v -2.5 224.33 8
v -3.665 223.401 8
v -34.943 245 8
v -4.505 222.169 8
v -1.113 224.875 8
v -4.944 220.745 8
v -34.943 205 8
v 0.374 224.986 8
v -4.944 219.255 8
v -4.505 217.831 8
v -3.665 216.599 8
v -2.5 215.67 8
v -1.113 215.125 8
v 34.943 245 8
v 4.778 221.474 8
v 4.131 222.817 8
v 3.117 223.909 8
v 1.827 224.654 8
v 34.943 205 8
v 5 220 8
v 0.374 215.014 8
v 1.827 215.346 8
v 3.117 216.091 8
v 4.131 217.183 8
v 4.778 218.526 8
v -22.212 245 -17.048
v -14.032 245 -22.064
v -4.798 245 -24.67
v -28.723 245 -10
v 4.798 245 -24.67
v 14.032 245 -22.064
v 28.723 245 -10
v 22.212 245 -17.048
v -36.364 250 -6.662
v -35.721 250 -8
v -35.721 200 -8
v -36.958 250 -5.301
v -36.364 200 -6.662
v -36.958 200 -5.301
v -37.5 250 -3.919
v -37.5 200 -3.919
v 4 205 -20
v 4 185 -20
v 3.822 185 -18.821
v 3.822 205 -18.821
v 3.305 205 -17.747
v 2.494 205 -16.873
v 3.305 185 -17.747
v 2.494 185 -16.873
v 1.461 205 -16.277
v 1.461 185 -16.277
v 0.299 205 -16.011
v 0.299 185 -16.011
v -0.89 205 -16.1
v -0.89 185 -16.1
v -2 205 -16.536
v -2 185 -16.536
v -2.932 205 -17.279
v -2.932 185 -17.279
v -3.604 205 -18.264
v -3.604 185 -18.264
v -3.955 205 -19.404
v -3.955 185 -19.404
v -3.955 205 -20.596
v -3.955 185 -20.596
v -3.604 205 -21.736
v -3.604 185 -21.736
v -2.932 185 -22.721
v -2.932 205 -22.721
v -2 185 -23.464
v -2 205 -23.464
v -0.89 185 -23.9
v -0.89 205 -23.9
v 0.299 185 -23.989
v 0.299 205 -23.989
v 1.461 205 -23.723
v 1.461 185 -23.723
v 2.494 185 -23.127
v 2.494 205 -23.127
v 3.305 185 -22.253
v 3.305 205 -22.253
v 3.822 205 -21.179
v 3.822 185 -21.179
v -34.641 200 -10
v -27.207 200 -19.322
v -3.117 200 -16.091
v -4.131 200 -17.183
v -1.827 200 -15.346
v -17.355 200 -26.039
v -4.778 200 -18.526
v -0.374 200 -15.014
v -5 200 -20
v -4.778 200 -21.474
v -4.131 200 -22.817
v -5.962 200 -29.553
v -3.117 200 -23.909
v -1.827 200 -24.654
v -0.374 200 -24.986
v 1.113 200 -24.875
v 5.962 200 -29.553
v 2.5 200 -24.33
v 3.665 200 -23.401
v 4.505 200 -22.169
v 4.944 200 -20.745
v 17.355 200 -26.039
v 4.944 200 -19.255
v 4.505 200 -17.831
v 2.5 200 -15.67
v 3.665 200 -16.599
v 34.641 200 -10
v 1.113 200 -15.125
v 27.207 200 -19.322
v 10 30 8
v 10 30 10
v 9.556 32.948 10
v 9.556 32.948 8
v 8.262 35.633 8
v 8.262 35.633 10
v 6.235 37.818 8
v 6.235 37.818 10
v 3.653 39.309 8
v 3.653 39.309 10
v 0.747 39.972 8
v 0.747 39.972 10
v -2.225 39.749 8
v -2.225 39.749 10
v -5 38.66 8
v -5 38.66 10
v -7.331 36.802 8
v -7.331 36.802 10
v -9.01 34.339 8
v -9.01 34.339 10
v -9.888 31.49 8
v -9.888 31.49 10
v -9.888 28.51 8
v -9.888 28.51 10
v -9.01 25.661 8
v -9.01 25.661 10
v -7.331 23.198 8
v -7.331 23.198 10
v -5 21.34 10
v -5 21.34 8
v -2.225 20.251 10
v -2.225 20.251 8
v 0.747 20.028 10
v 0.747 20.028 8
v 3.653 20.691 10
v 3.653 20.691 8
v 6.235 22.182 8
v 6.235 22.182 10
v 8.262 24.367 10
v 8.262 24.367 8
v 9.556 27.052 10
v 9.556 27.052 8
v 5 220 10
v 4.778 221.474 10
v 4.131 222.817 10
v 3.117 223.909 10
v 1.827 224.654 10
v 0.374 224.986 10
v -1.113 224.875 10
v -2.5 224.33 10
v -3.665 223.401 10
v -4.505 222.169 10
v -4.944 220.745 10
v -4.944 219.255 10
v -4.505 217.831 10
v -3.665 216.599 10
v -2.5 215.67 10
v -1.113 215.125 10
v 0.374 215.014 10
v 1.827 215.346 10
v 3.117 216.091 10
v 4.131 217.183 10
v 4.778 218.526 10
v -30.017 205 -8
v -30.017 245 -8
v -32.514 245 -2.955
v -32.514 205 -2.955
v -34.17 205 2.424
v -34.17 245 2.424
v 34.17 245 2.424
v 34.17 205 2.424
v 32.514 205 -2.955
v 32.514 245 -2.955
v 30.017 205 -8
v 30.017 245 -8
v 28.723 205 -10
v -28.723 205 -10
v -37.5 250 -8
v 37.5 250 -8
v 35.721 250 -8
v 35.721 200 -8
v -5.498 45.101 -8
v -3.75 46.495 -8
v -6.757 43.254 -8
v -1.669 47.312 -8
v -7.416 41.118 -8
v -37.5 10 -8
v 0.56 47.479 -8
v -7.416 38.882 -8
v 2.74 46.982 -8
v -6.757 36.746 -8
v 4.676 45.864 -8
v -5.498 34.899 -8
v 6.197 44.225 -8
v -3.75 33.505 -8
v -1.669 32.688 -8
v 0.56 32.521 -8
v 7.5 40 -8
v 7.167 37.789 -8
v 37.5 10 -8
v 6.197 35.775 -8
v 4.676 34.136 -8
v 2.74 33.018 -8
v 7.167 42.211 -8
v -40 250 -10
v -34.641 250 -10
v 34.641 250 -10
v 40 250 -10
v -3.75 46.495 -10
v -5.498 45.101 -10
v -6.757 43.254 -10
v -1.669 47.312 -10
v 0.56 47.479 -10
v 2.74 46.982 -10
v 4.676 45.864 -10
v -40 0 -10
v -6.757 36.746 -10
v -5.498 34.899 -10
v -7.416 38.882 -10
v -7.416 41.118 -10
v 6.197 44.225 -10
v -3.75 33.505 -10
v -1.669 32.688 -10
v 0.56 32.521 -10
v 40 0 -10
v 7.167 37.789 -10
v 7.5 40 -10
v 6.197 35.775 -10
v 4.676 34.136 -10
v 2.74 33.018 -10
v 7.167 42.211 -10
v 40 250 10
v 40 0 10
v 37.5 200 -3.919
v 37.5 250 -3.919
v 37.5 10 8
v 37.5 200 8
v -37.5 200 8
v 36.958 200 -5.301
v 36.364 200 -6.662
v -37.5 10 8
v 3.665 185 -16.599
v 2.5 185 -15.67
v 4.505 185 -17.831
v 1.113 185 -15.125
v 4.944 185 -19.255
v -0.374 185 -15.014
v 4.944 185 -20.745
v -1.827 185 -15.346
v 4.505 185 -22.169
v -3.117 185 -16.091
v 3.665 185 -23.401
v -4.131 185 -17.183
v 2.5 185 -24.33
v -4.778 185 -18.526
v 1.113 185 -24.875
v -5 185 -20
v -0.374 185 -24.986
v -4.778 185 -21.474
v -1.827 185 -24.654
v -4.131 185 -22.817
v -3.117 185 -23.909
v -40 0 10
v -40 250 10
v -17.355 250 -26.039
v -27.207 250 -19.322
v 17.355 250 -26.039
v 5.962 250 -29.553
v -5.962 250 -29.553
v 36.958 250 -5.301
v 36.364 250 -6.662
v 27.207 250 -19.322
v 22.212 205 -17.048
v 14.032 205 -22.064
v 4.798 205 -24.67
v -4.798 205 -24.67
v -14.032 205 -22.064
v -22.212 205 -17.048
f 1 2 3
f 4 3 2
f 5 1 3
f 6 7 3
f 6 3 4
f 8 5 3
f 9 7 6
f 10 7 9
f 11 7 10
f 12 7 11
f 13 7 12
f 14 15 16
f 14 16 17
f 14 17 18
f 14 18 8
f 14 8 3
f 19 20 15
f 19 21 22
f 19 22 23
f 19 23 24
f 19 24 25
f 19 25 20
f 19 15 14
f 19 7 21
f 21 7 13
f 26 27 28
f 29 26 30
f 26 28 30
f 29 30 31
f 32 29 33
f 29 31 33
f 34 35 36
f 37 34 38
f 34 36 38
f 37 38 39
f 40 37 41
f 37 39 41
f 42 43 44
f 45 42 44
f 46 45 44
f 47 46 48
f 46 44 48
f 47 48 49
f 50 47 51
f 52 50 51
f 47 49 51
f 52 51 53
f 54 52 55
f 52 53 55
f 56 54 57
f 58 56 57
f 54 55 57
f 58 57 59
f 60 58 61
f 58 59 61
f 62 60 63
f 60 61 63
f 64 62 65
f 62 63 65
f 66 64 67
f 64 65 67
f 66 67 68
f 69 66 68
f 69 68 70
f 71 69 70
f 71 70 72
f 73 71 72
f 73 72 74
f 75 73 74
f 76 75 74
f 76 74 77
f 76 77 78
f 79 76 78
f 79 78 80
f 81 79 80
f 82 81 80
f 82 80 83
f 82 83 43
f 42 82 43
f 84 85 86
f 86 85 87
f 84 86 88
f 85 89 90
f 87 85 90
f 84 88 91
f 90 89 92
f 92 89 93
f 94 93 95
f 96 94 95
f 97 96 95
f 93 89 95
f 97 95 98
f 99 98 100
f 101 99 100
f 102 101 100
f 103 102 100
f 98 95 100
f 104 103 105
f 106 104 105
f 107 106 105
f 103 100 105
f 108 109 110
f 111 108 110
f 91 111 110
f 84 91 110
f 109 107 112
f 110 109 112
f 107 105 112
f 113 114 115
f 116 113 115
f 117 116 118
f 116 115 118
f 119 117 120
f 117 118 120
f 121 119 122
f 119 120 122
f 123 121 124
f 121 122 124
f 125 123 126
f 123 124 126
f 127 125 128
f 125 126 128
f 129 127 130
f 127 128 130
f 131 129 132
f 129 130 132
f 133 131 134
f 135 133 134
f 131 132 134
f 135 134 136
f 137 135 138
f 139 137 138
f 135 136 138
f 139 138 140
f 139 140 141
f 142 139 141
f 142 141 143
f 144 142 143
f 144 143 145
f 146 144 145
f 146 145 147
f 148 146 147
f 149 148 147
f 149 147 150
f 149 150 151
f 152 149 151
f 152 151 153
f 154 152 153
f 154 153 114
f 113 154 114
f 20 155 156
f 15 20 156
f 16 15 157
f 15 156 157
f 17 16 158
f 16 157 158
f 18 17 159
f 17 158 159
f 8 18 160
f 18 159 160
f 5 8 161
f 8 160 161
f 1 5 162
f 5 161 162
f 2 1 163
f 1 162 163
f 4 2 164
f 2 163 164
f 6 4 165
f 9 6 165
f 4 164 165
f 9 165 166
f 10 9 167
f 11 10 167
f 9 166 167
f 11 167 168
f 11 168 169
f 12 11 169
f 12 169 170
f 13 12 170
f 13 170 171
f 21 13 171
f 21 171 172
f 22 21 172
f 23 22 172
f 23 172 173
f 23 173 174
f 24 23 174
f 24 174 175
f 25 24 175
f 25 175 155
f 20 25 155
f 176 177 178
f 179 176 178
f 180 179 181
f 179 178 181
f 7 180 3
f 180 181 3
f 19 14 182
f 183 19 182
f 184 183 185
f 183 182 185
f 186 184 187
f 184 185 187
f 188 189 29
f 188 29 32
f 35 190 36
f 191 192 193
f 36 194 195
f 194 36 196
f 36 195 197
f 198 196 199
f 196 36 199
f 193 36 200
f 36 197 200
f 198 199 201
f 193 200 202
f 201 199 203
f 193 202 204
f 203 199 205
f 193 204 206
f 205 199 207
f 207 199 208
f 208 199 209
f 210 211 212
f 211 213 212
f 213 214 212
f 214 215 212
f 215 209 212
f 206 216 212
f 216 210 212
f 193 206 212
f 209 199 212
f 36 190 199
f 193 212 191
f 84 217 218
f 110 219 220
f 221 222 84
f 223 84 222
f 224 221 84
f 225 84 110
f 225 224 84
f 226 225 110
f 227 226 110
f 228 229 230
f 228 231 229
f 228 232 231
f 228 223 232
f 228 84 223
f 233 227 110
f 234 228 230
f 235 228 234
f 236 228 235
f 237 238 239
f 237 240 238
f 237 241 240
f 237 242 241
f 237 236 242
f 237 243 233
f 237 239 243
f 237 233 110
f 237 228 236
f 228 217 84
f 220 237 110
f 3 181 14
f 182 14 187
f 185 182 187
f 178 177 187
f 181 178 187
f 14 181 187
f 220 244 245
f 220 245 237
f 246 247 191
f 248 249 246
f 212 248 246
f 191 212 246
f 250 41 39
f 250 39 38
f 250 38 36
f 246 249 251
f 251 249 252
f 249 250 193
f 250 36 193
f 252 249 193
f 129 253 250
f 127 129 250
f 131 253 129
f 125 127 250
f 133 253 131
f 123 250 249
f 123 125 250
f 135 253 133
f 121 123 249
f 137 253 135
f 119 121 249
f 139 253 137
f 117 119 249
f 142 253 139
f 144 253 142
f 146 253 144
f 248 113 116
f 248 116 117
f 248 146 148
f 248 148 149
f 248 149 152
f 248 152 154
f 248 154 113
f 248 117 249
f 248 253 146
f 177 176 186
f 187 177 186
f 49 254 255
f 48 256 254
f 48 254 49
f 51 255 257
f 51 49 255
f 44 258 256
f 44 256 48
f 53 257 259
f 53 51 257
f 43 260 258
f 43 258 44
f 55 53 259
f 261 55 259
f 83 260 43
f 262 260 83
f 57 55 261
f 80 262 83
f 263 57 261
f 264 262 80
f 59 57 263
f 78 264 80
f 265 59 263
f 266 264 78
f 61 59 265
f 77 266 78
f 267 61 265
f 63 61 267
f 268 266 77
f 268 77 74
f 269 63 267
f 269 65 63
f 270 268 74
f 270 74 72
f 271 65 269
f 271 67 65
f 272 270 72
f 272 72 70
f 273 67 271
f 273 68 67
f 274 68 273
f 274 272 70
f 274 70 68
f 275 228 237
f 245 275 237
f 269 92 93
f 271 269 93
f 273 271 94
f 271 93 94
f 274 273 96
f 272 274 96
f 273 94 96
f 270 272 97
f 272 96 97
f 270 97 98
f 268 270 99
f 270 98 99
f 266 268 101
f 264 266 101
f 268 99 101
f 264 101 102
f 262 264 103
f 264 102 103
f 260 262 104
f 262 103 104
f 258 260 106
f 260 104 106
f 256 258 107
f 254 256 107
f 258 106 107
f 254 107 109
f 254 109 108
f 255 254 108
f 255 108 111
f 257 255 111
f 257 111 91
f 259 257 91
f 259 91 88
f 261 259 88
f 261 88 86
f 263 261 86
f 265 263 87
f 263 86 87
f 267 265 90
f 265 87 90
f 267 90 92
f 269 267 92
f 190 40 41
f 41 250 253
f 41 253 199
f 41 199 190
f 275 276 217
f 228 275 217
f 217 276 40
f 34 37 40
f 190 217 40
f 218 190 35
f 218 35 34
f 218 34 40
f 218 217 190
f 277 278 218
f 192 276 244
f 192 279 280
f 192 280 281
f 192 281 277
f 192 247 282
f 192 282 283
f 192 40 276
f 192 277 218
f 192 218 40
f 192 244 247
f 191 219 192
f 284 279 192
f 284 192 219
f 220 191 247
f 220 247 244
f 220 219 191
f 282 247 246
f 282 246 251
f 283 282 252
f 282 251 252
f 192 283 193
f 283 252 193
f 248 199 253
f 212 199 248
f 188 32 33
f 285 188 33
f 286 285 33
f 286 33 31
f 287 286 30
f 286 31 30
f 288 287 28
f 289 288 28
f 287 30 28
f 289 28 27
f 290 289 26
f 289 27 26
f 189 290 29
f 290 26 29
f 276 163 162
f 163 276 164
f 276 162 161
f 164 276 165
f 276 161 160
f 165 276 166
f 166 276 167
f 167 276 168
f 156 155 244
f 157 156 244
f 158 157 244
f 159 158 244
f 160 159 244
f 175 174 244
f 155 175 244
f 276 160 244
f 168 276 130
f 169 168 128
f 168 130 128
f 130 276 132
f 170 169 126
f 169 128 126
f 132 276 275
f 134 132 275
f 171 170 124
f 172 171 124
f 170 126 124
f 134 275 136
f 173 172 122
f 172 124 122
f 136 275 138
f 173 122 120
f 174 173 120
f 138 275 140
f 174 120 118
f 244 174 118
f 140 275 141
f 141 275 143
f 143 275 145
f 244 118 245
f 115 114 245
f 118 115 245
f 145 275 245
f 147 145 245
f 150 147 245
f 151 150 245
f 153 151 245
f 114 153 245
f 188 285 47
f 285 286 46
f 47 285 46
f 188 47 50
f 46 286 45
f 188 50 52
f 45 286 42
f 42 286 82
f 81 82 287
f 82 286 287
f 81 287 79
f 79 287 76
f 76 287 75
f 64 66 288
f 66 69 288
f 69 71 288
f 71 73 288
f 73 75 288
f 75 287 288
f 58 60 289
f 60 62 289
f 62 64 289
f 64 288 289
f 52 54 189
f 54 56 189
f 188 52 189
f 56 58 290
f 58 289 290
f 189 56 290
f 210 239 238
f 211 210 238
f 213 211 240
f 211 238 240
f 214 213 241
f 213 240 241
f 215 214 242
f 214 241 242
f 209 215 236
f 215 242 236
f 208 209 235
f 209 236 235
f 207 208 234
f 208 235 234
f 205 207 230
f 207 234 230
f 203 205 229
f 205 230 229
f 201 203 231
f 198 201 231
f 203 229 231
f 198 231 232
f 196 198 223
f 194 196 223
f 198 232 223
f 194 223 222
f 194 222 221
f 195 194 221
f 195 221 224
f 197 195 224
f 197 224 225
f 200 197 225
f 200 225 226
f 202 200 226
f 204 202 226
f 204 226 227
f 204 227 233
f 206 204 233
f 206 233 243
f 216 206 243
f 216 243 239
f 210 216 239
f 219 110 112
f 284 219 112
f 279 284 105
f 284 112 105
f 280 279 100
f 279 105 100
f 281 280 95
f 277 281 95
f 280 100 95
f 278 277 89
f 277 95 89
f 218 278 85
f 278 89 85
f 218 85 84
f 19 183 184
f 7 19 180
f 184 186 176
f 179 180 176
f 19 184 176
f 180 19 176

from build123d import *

# Parameters (mm, degrees)
SKETCH1_W           = 80
SKETCH1_H           = 20
BOSS_EXTRUDE1_DEPTH = 200
SKETCH2_W           = 75
SKETCH2_H           = 16
CUT_EXTRUDE1_DEPTH  = 190
SKETCH3_R           = 7.5
CUT_EXTRUDE3_DEPTH  = 10
SKETCH4_W           = 80
SKETCH4_H           = 20
SKETCH4_W_2         = 75
SKETCH4_H_2         = 16
BOSS_EXTRUDE2_DEPTH = 50
SKETCH5_R           = 5
CUT_EXTRUDE4_DEPTH  = 10
REVOLVE1_ANGLE      = 180
SKETCH8_R           = 10
CUT_EXTRUDE5_DEPTH  = 10
SKETCH7_R           = 5
BOSS_EXTRUDE3_DEPTH = 15
SKETCH9_R           = 4
CUT_EXTRUDE6_DEPTH  = 30


with BuildPart() as part:
    # Sketch1 → Boss-Extrude1 (new body)
    with BuildSketch(Plane(origin=(0, 0, 0), x_dir=(1, 0, 0), z_dir=(0, 1, 0))):
        Rectangle(SKETCH1_W, SKETCH1_H)
    extrude(amount=BOSS_EXTRUDE1_DEPTH)

    # Sketch2 → Cut-Extrude1 (cut)
    with BuildSketch(Plane(origin=(0, 200, 0), x_dir=(1, 0, 0), z_dir=(0, 1, 0))):
        Rectangle(SKETCH2_W, SKETCH2_H)
    extrude(amount=-CUT_EXTRUDE1_DEPTH, mode=Mode.SUBTRACT)

    # Sketch3 → Cut-Extrude3 (cut)
    with BuildSketch(Plane(origin=(0, 0, -10), x_dir=(-1, 0, 0), z_dir=(0, 0, -1))):
        with Locations(Location((0, 40, 0), (0, 0, 180))):
            Circle(SKETCH3_R)
    extrude(amount=-CUT_EXTRUDE3_DEPTH, mode=Mode.SUBTRACT)

    # Sketch4 → Boss-Extrude2 (add)
    with BuildSketch(Plane(origin=(0, 200, 0), x_dir=(1, 0, 0), z_dir=(0, 1, 0))):
        Rectangle(SKETCH4_W, SKETCH4_H)
        Rectangle(SKETCH4_W_2, SKETCH4_H_2, mode=Mode.SUBTRACT)
    extrude(amount=BOSS_EXTRUDE2_DEPTH)

    # Sketch5 → Cut-Extrude4 (cut)
    with BuildSketch(Plane.XY.offset(10)):
        with Locations((0, 220)):
            Circle(SKETCH5_R)
    extrude(amount=-CUT_EXTRUDE4_DEPTH, mode=Mode.SUBTRACT)

    # Sketch6 → Revolve1 (revolve)
    with BuildSketch(Plane.XY.offset(10)):
        Polygon((0, 250), (40, 250), (40, 200), (0, 200), (0, 205), (35, 205), (35, 245), (0, 245), align=None)
    revolve(axis=Axis((0, 0, 10), (0, 1, 0)), revolution_arc=REVOLVE1_ANGLE)

    # Sketch8 → Cut-Extrude5 (cut)
    with BuildSketch(Plane.XY.offset(10)):
        with Locations((0, 30)):
            Circle(SKETCH8_R)
    extrude(amount=-CUT_EXTRUDE5_DEPTH, mode=Mode.SUBTRACT)

    # Sketch7 → Boss-Extrude3 (add)
    with BuildSketch(Plane.XZ.offset(-200)):
        with Locations(Location((0, -20, 0), (0, 0, 180))):
            Circle(SKETCH7_R)
    extrude(amount=BOSS_EXTRUDE3_DEPTH)

    # Sketch9 → Cut-Extrude6 (cut)
    with BuildSketch(Plane.XZ.offset(-185)):
        with Locations((0, -20)):
            Circle(SKETCH9_R)
    extrude(amount=-CUT_EXTRUDE6_DEPTH, mode=Mode.SUBTRACT)


solid = part.part
